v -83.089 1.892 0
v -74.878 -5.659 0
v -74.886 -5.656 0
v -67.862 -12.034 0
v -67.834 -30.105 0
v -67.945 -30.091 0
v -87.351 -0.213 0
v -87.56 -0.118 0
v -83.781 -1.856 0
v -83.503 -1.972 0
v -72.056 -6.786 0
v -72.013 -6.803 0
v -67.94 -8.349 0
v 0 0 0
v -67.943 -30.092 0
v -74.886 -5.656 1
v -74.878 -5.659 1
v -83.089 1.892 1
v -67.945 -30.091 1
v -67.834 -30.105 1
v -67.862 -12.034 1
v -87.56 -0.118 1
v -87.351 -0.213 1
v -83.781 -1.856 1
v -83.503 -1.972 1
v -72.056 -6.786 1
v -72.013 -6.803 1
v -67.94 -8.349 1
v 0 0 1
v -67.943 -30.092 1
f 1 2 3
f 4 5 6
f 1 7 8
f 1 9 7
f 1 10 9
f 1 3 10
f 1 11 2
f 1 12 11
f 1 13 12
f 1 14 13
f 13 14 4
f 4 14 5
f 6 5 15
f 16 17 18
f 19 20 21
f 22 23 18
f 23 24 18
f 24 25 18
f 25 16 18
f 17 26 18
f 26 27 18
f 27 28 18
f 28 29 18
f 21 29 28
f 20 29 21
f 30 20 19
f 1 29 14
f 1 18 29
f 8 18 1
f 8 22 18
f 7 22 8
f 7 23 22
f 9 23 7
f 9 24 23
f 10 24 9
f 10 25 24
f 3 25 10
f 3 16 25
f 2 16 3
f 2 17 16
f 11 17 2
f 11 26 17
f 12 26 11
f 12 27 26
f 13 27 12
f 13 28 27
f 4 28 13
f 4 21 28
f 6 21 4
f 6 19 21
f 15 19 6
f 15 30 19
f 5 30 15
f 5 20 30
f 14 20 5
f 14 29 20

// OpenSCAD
// Generated by SolidPython 1.1.3 on 2024-05-19 23:35:49


linear_extrude(height = 1) {
	polygon(points = [[0, 0], [-83.0891695313, 1.8917038359], [-83.1579500000, 1.8607885000], [-83.2267304687, 1.8298731641], [-83.2955109375, 1.7989578281], [-83.3642914063, 1.7680424922], [-83.4330718750, 1.7371271563], [-83.5018523437, 1.7062118203], [-83.5706328125, 1.6752964844], [-83.6394132813, 1.6443811484], [-83.7081937500, 1.6134658125], [-83.7769742187, 1.5825504766], [-83.8457546875, 1.5516351406], [-83.9145351562, 1.5207198047], [-83.9833156250, 1.4898044688], [-84.0520960937, 1.4588891328], [-84.1208765625, 1.4279737969], [-84.1896570312, 1.3970584609], [-84.2584375000, 1.3661431250], [-84.3272179688, 1.3352277891], [-84.3959984375, 1.3043124531], [-84.4647789063, 1.2733971172], [-84.5335593750, 1.2424817813], [-84.6023398438, 1.2115664453], [-84.6711203125, 1.1806511094], [-84.7399007813, 1.1497357734], [-84.8086812500, 1.1188204375], [-84.8774617187, 1.0879051016], [-84.9462421875, 1.0569897656], [-85.0150226563, 1.0260744297], [-85.0838031250, 0.9951590938], [-85.1525835937, 0.9642437578], [-85.2213640625, 0.9333284219], [-85.2901445313, 0.9024130859], [-85.3589250000, 0.8714977500], [-85.4277054687, 0.8405824141], [-85.4964859375, 0.8096670781], [-85.5652664063, 0.7787517422], [-85.6340468750, 0.7478364063], [-85.7028273437, 0.7169210703], [-85.7716078125, 0.6860057344], [-85.8403882813, 0.6550903984], [-85.9091687500, 0.6241750625], [-85.9779492187, 0.5932597266], [-86.0467296875, 0.5623443906], [-86.1155101562, 0.5314290547], [-86.1842906250, 0.5005137187], [-86.2530710937, 0.4695983828], [-86.3218515625, 0.4386830469], [-86.3906320312, 0.4077677109], [-86.4594125000, 0.3768523750], [-86.5281929688, 0.3459370391], [-86.5969734375, 0.3150217031], [-86.6657539063, 0.2841063672], [-86.7345343750, 0.2531910313], [-86.8033148438, 0.2222756953], [-86.8720953125, 0.1913603594], [-86.9408757813, 0.1604450234], [-87.0096562500, 0.1295296875], [-87.0784367187, 0.0986143516], [-87.1472171875, 0.0676990156], [-87.2159976563, 0.0367836797], [-87.2847781250, 0.0058683438], [-87.3535585937, -0.0250469922], [-87.4223390625, -0.0559623281], [-87.4911195313, -0.0868776641], [-87.5599000000, -0.1177930000], [-87.5078000000, -0.1415062500], [-87.4557000000, -0.1652195000], [-87.4036000000, -0.1889327500], [-87.3515000000, -0.2126460000], [-87.2957093750, -0.2383304375], [-87.2399187500, -0.2640148750], [-87.1841281250, -0.2896993125], [-87.1283375000, -0.3153837500], [-87.0725468750, -0.3410681875], [-87.0167562500, -0.3667526250], [-86.9609656250, -0.3924370625], [-86.9051750000, -0.4181215000], [-86.8493843750, -0.4438059375], [-86.7935937500, -0.4694903750], [-86.7378031250, -0.4951748125], [-86.6820125000, -0.5208592500], [-86.6262218750, -0.5465436875], [-86.5704312500, -0.5722281250], [-86.5146406250, -0.5979125625], [-86.4588500000, -0.6235970000], [-86.4030593750, -0.6492814375], [-86.3472687500, -0.6749658750], [-86.2914781250, -0.7006503125], [-86.2356875000, -0.7263347500], [-86.1798968750, -0.7520191875], [-86.1241062500, -0.7777036250], [-86.0683156250, -0.8033880625], [-86.0125250000, -0.8290725000], [-85.9567343750, -0.8547569375], [-85.9009437500, -0.8804413750], [-85.8451531250, -0.9061258125], [-85.7893625000, -0.9318102500], [-85.7335718750, -0.9574946875], [-85.6777812500, -0.9831791250], [-85.6219906250, -1.0088635625], [-85.5662000000, -1.0345480000], [-85.5104093750, -1.0602324375], [-85.4546187500, -1.0859168750], [-85.3988281250, -1.1116013125], [-85.3430375000, -1.1372857500], [-85.2872468750, -1.1629701875], [-85.2314562500, -1.1886546250], [-85.1756656250, -1.2143390625], [-85.1198750000, -1.2400235000], [-85.0640843750, -1.2657079375], [-85.0082937500, -1.2913923750], [-84.9525031250, -1.3170768125], [-84.8967125000, -1.3427612500], [-84.8409218750, -1.3684456875], [-84.7851312500, -1.3941301250], [-84.7293406250, -1.4198145625], [-84.6735500000, -1.4454990000], [-84.6177593750, -1.4711834375], [-84.5619687500, -1.4968678750], [-84.5061781250, -1.5225523125], [-84.4503875000, -1.5482367500], [-84.3945968750, -1.5739211875], [-84.3388062500, -1.5996056250], [-84.2830156250, -1.6252900625], [-84.2272250000, -1.6509745000], [-84.1714343750, -1.6766589375], [-84.1156437500, -1.7023433750], [-84.0598531250, -1.7280278125], [-84.0040625000, -1.7537122500], [-83.9482718750, -1.7793966875], [-83.8924812500, -1.8050811250], [-83.8366906250, -1.8307655625], [-83.7809000000, -1.8564500000], [-83.7114750000, -1.8854125000], [-83.6420500000, -1.9143750000], [-83.5726250000, -1.9433375000], [-83.5032000000, -1.9723000000], [-83.4358750000, -2.0010806250], [-83.3685500000, -2.0298612500], [-83.3012250000, -2.0586418750], [-83.2339000000, -2.0874225000], [-83.1665750000, -2.1162031250], [-83.0992500000, -2.1449837500], [-83.0319250000, -2.1737643750], [-82.9646000000, -2.2025450000], [-82.8972750000, -2.2313256250], [-82.8299500000, -2.2601062500], [-82.7626250000, -2.2888868750], [-82.6953000000, -2.3176675000], [-82.6279750000, -2.3464481250], [-82.5606500000, -2.3752287500], [-82.4933250000, -2.4040093750], [-82.4260000000, -2.4327900000], [-82.3586750000, -2.4615706250], [-82.2913500000, -2.4903512500], [-82.2240250000, -2.5191318750], [-82.1567000000, -2.5479125000], [-82.0893750000, -2.5766931250], [-82.0220500000, -2.6054737500], [-81.9547250000, -2.6342543750], [-81.8874000000, -2.6630350000], [-81.8200750000, -2.6918156250], [-81.7527500000, -2.7205962500], [-81.6854250000, -2.7493768750], [-81.6181000000, -2.7781575000], [-81.5507750000, -2.8069381250], [-81.4834500000, -2.8357187500], [-81.4161250000, -2.8644993750], [-81.3488000000, -2.8932800000], [-81.2814750000, -2.9220606250], [-81.2141500000, -2.9508412500], [-81.1468250000, -2.9796218750], [-81.0795000000, -3.0084025000], [-81.0121750000, -3.0371831250], [-80.9448500000, -3.0659637500], [-80.8775250000, -3.0947443750], [-80.8102000000, -3.1235250000], [-80.7428750000, -3.1523056250], [-80.6755500000, -3.1810862500], [-80.6082250000, -3.2098668750], [-80.5409000000, -3.2386475000], [-80.4735750000, -3.2674281250], [-80.4062500000, -3.2962087500], [-80.3389250000, -3.3249893750], [-80.2716000000, -3.3537700000], [-80.2042750000, -3.3825506250], [-80.1369500000, -3.4113312500], [-80.0696250000, -3.4401118750], [-80.0023000000, -3.4688925000], [-79.9349750000, -3.4976731250], [-79.8676500000, -3.5264537500], [-79.8003250000, -3.5552343750], [-79.7330000000, -3.5840150000], [-79.6656750000, -3.6127956250], [-79.5983500000, -3.6415762500], [-79.5310250000, -3.6703568750], [-79.4637000000, -3.6991375000], [-79.3963750000, -3.7279181250], [-79.3290500000, -3.7566987500], [-79.2617250000, -3.7854793750], [-79.1944000000, -3.8142600000], [-79.1270750000, -3.8430406250], [-79.0597500000, -3.8718212500], [-78.9924250000, -3.9006018750], [-78.9251000000, -3.9293825000], [-78.8577750000, -3.9581631250], [-78.7904500000, -3.9869437500], [-78.7231250000, -4.0157243750], [-78.6558000000, -4.0445050000], [-78.5884750000, -4.0732856250], [-78.5211500000, -4.1020662500], [-78.4538250000, -4.1308468750], [-78.3865000000, -4.1596275000], [-78.3191750000, -4.1884081250], [-78.2518500000, -4.2171887500], [-78.1845250000, -4.2459693750], [-78.1172000000, -4.2747500000], [-78.0498750000, -4.3035306250], [-77.9825500000, -4.3323112500], [-77.9152250000, -4.3610918750], [-77.8479000000, -4.3898725000], [-77.7805750000, -4.4186531250], [-77.7132500000, -4.4474337500], [-77.6459250000, -4.4762143750], [-77.5786000000, -4.5049950000], [-77.5112750000, -4.5337756250], [-77.4439500000, -4.5625562500], [-77.3766250000, -4.5913368750], [-77.3093000000, -4.6201175000], [-77.2419750000, -4.6488981250], [-77.1746500000, -4.6776787500], [-77.1073250000, -4.7064593750], [-77.0400000000, -4.7352400000], [-76.9726750000, -4.7640206250], [-76.9053500000, -4.7928012500], [-76.8380250000, -4.8215818750], [-76.7707000000, -4.8503625000], [-76.7033750000, -4.8791431250], [-76.6360500000, -4.9079237500], [-76.5687250000, -4.9367043750], [-76.5014000000, -4.9654850000], [-76.4340750000, -4.9942656250], [-76.3667500000, -5.0230462500], [-76.2994250000, -5.0518268750], [-76.2321000000, -5.0806075000], [-76.1647750000, -5.1093881250], [-76.0974500000, -5.1381687500], [-76.0301250000, -5.1669493750], [-75.9628000000, -5.1957300000], [-75.8954750000, -5.2245106250], [-75.8281500000, -5.2532912500], [-75.7608250000, -5.2820718750], [-75.6935000000, -5.3108525000], [-75.6261750000, -5.3396331250], [-75.5588500000, -5.3684137500], [-75.4915250000, -5.3971943750], [-75.4242000000, -5.4259750000], [-75.3568750000, -5.4547556250], [-75.2895500000, -5.4835362500], [-75.2222250000, -5.5123168750], [-75.1549000000, -5.5410975000], [-75.0875750000, -5.5698781250], [-75.0202500000, -5.5986587500], [-74.9529250000, -5.6274393750], [-74.8856000000, -5.6562200000], [-74.8780000000, -5.6592000000], [-74.7898125000, -5.6944259375], [-74.7016250000, -5.7296518750], [-74.6134375000, -5.7648778125], [-74.5252500000, -5.8001037500], [-74.4370625000, -5.8353296875], [-74.3488750000, -5.8705556250], [-74.2606875000, -5.9057815625], [-74.1725000000, -5.9410075000], [-74.0843125000, -5.9762334375], [-73.9961250000, -6.0114593750], [-73.9079375000, -6.0466853125], [-73.8197500000, -6.0819112500], [-73.7315625000, -6.1171371875], [-73.6433750000, -6.1523631250], [-73.5551875000, -6.1875890625], [-73.4670000000, -6.2228150000], [-73.3788125000, -6.2580409375], [-73.2906250000, -6.2932668750], [-73.2024375000, -6.3284928125], [-73.1142500000, -6.3637187500], [-73.0260625000, -6.3989446875], [-72.9378750000, -6.4341706250], [-72.8496875000, -6.4693965625], [-72.7615000000, -6.5046225000], [-72.6733125000, -6.5398484375], [-72.5851250000, -6.5750743750], [-72.4969375000, -6.6103003125], [-72.4087500000, -6.6455262500], [-72.3205625000, -6.6807521875], [-72.2323750000, -6.7159781250], [-72.1441875000, -6.7512040625], [-72.0560000000, -6.7864300000], [-72.0130000000, -6.8028000000], [-71.9493640625, -6.8269568750], [-71.8857281250, -6.8511137500], [-71.8220921875, -6.8752706250], [-71.7584562500, -6.8994275000], [-71.6948203125, -6.9235843750], [-71.6311843750, -6.9477412500], [-71.5675484375, -6.9718981250], [-71.5039125000, -6.9960550000], [-71.4402765625, -7.0202118750], [-71.3766406250, -7.0443687500], [-71.3130046875, -7.0685256250], [-71.2493687500, -7.0926825000], [-71.1857328125, -7.1168393750], [-71.1220968750, -7.1409962500], [-71.0584609375, -7.1651531250], [-70.9948250000, -7.1893100000], [-70.9311890625, -7.2134668750], [-70.8675531250, -7.2376237500], [-70.8039171875, -7.2617806250], [-70.7402812500, -7.2859375000], [-70.6766453125, -7.3100943750], [-70.6130093750, -7.3342512500], [-70.5493734375, -7.3584081250], [-70.4857375000, -7.3825650000], [-70.4221015625, -7.4067218750], [-70.3584656250, -7.4308787500], [-70.2948296875, -7.4550356250], [-70.2311937500, -7.4791925000], [-70.1675578125, -7.5033493750], [-70.1039218750, -7.5275062500], [-70.0402859375, -7.5516631250], [-69.9766500000, -7.5758200000], [-69.9130140625, -7.5999768750], [-69.8493781250, -7.6241337500], [-69.7857421875, -7.6482906250], [-69.7221062500, -7.6724475000], [-69.6584703125, -7.6966043750], [-69.5948343750, -7.7207612500], [-69.5311984375, -7.7449181250], [-69.4675625000, -7.7690750000], [-69.4039265625, -7.7932318750], [-69.3402906250, -7.8173887500], [-69.2766546875, -7.8415456250], [-69.2130187500, -7.8657025000], [-69.1493828125, -7.8898593750], [-69.0857468750, -7.9140162500], [-69.0221109375, -7.9381731250], [-68.9584750000, -7.9623300000], [-68.8948390625, -7.9864868750], [-68.8312031250, -8.0106437500], [-68.7675671875, -8.0348006250], [-68.7039312500, -8.0589575000], [-68.6402953125, -8.0831143750], [-68.5766593750, -8.1072712500], [-68.5130234375, -8.1314281250], [-68.4493875000, -8.1555850000], [-68.3857515625, -8.1797418750], [-68.3221156250, -8.2038987500], [-68.2584796875, -8.2280556250], [-68.1948437500, -8.2522125000], [-68.1312078125, -8.2763693750], [-68.0675718750, -8.3005262500], [-68.0039359375, -8.3246831250], [-67.9403000000, -8.3488400000], [-67.9390703125, -8.4064143750], [-67.9378406250, -8.4639887500], [-67.9366109375, -8.5215631250], [-67.9353812500, -8.5791375000], [-67.9341515625, -8.6367118750], [-67.9329218750, -8.6942862500], [-67.9316921875, -8.7518606250], [-67.9304625000, -8.8094350000], [-67.9292328125, -8.8670093750], [-67.9280031250, -8.9245837500], [-67.9267734375, -8.9821581250], [-67.9255437500, -9.0397325000], [-67.9243140625, -9.0973068750], [-67.9230843750, -9.1548812500], [-67.9218546875, -9.2124556250], [-67.9206250000, -9.2700300000], [-67.9193953125, -9.3276043750], [-67.9181656250, -9.3851787500], [-67.9169359375, -9.4427531250], [-67.9157062500, -9.5003275000], [-67.9144765625, -9.5579018750], [-67.9132468750, -9.6154762500], [-67.9120171875, -9.6730506250], [-67.9107875000, -9.7306250000], [-67.9095578125, -9.7881993750], [-67.9083281250, -9.8457737500], [-67.9070984375, -9.9033481250], [-67.9058687500, -9.9609225000], [-67.9046390625, -10.0184968750], [-67.9034093750, -10.0760712500], [-67.9021796875, -10.1336456250], [-67.9009500000, -10.1912200000], [-67.8997203125, -10.2487943750], [-67.8984906250, -10.3063687500], [-67.8972609375, -10.3639431250], [-67.8960312500, -10.4215175000], [-67.8948015625, -10.4790918750], [-67.8935718750, -10.5366662500], [-67.8923421875, -10.5942406250], [-67.8911125000, -10.6518150000], [-67.8898828125, -10.7093893750], [-67.8886531250, -10.7669637500], [-67.8874234375, -10.8245381250], [-67.8861937500, -10.8821125000], [-67.8849640625, -10.9396868750], [-67.8837343750, -10.9972612500], [-67.8825046875, -11.0548356250], [-67.8812750000, -11.1124100000], [-67.8800453125, -11.1699843750], [-67.8788156250, -11.2275587500], [-67.8775859375, -11.2851331250], [-67.8763562500, -11.3427075000], [-67.8751265625, -11.4002818750], [-67.8738968750, -11.4578562500], [-67.8726671875, -11.5154306250], [-67.8714375000, -11.5730050000], [-67.8702078125, -11.6305793750], [-67.8689781250, -11.6881537500], [-67.8677484375, -11.7457281250], [-67.8665187500, -11.8033025000], [-67.8652890625, -11.8608768750], [-67.8640593750, -11.9184512500], [-67.8628296875, -11.9760256250], [-67.8616000000, -12.0336000000], [-67.8619257812, -12.1041386719], [-67.8622515625, -12.1746773437], [-67.8625773438, -12.2452160156], [-67.8629031250, -12.3157546875], [-67.8632289063, -12.3862933594], [-67.8635546875, -12.4568320313], [-67.8638804687, -12.5273707031], [-67.8642062500, -12.5979093750], [-67.8645320312, -12.6684480469], [-67.8648578125, -12.7389867188], [-67.8651835938, -12.8095253906], [-67.8655093750, -12.8800640625], [-67.8658351563, -12.9506027344], [-67.8661609375, -13.0211414063], [-67.8664867188, -13.0916800781], [-67.8668125000, -13.1622187500], [-67.8671382813, -13.2327574219], [-67.8674640625, -13.3032960938], [-67.8677898438, -13.3738347656], [-67.8681156250, -13.4443734375], [-67.8684414062, -13.5149121094], [-67.8687671875, -13.5854507813], [-67.8690929688, -13.6559894531], [-67.8694187500, -13.7265281250], [-67.8697445313, -13.7970667969], [-67.8700703125, -13.8676054688], [-67.8703960938, -13.9381441406], [-67.8707218750, -14.0086828125], [-67.8710476563, -14.0792214844], [-67.8713734375, -14.1497601563], [-67.8716992188, -14.2202988281], [-67.8720250000, -14.2908375000], [-67.8723507813, -14.3613761719], [-67.8726765625, -14.4319148438], [-67.8730023438, -14.5024535156], [-67.8733281250, -14.5729921875], [-67.8736539062, -14.6435308594], [-67.8739796875, -14.7140695312], [-67.8743054688, -14.7846082031], [-67.8746312500, -14.8551468750], [-67.8749570313, -14.9256855469], [-67.8752828125, -14.9962242187], [-67.8756085938, -15.0667628906], [-67.8759343750, -15.1373015625], [-67.8762601563, -15.2078402344], [-67.8765859375, -15.2783789062], [-67.8769117188, -15.3489175781], [-67.8772375000, -15.4194562500], [-67.8775632813, -15.4899949219], [-67.8778890625, -15.5605335937], [-67.8782148438, -15.6310722656], [-67.8785406250, -15.7016109375], [-67.8788664062, -15.7721496094], [-67.8791921875, -15.8426882813], [-67.8795179688, -15.9132269531], [-67.8798437500, -15.9837656250], [-67.8801695313, -16.0543042969], [-67.8804953125, -16.1248429688], [-67.8808210938, -16.1953816406], [-67.8811468750, -16.2659203125], [-67.8814726563, -16.3364589844], [-67.8817984375, -16.4069976562], [-67.8821242188, -16.4775363281], [-67.8824500000, -16.5480750000], [-67.8827757813, -16.6186136719], [-67.8831015625, -16.6891523438], [-67.8834273438, -16.7596910156], [-67.8837531250, -16.8302296875], [-67.8840789062, -16.9007683594], [-67.8844046875, -16.9713070312], [-67.8847304688, -17.0418457031], [-67.8850562500, -17.1123843750], [-67.8853820313, -17.1829230469], [-67.8857078125, -17.2534617187], [-67.8860335938, -17.3240003906], [-67.8863593750, -17.3945390625], [-67.8866851563, -17.4650777344], [-67.8870109375, -17.5356164062], [-67.8873367188, -17.6061550781], [-67.8876625000, -17.6766937500], [-67.8879882813, -17.7472324219], [-67.8883140625, -17.8177710937], [-67.8886398437, -17.8883097656], [-67.8889656250, -17.9588484375], [-67.8892914062, -18.0293871094], [-67.8896171875, -18.0999257813], [-67.8899429688, -18.1704644531], [-67.8902687500, -18.2410031250], [-67.8905945313, -18.3115417969], [-67.8909203125, -18.3820804687], [-67.8912460938, -18.4526191406], [-67.8915718750, -18.5231578125], [-67.8918976563, -18.5936964844], [-67.8922234375, -18.6642351563], [-67.8925492188, -18.7347738281], [-67.8928750000, -18.8053125000], [-67.8932007813, -18.8758511719], [-67.8935265625, -18.9463898437], [-67.8938523437, -19.0169285156], [-67.8941781250, -19.0874671875], [-67.8945039062, -19.1580058594], [-67.8948296875, -19.2285445313], [-67.8951554688, -19.2990832031], [-67.8954812500, -19.3696218750], [-67.8958070313, -19.4401605469], [-67.8961328125, -19.5106992187], [-67.8964585938, -19.5812378906], [-67.8967843750, -19.6517765625], [-67.8971101563, -19.7223152344], [-67.8974359375, -19.7928539063], [-67.8977617188, -19.8633925781], [-67.8980875000, -19.9339312500], [-67.8984132813, -20.0044699219], [-67.8987390625, -20.0750085937], [-67.8990648437, -20.1455472656], [-67.8993906250, -20.2160859375], [-67.8997164062, -20.2866246094], [-67.9000421875, -20.3571632813], [-67.9003679688, -20.4277019531], [-67.9006937500, -20.4982406250], [-67.9010195313, -20.5687792969], [-67.9013453125, -20.6393179687], [-67.9016710938, -20.7098566406], [-67.9019968750, -20.7803953125], [-67.9023226563, -20.8509339844], [-67.9026484375, -20.9214726563], [-67.9029742188, -20.9920113281], [-67.9033000000, -21.0625500000], [-67.9036257812, -21.1330886719], [-67.9039515625, -21.2036273438], [-67.9042773437, -21.2741660156], [-67.9046031250, -21.3447046875], [-67.9049289062, -21.4152433594], [-67.9052546875, -21.4857820313], [-67.9055804688, -21.5563207031], [-67.9059062500, -21.6268593750], [-67.9062320312, -21.6973980469], [-67.9065578125, -21.7679367188], [-67.9068835938, -21.8384753906], [-67.9072093750, -21.9090140625], [-67.9075351563, -21.9795527344], [-67.9078609375, -22.0500914063], [-67.9081867188, -22.1206300781], [-67.9085125000, -22.1911687500], [-67.9088382812, -22.2617074219], [-67.9091640625, -22.3322460938], [-67.9094898437, -22.4027847656], [-67.9098156250, -22.4733234375], [-67.9101414062, -22.5438621094], [-67.9104671875, -22.6144007813], [-67.9107929688, -22.6849394531], [-67.9111187500, -22.7554781250], [-67.9114445312, -22.8260167969], [-67.9117703125, -22.8965554688], [-67.9120960938, -22.9670941406], [-67.9124218750, -23.0376328125], [-67.9127476563, -23.1081714844], [-67.9130734375, -23.1787101562], [-67.9133992188, -23.2492488281], [-67.9137250000, -23.3197875000], [-67.9140507812, -23.3903261719], [-67.9143765625, -23.4608648438], [-67.9147023437, -23.5314035156], [-67.9150281250, -23.6019421875], [-67.9153539062, -23.6724808594], [-67.9156796875, -23.7430195312], [-67.9160054688, -23.8135582031], [-67.9163312500, -23.8840968750], [-67.9166570312, -23.9546355469], [-67.9169828125, -24.0251742187], [-67.9173085938, -24.0957128906], [-67.9176343750, -24.1662515625], [-67.9179601563, -24.2367902344], [-67.9182859375, -24.3073289062], [-67.9186117188, -24.3778675781], [-67.9189375000, -24.4484062500], [-67.9192632812, -24.5189449219], [-67.9195890625, -24.5894835937], [-67.9199148437, -24.6600222656], [-67.9202406250, -24.7305609375], [-67.9205664062, -24.8010996094], [-67.9208921875, -24.8716382813], [-67.9212179687, -24.9421769531], [-67.9215437500, -25.0127156250], [-67.9218695312, -25.0832542969], [-67.9221953125, -25.1537929687], [-67.9225210938, -25.2243316406], [-67.9228468750, -25.2948703125], [-67.9231726563, -25.3654089844], [-67.9234984375, -25.4359476563], [-67.9238242187, -25.5064863281], [-67.9241500000, -25.5770250000], [-67.9244757812, -25.6475636719], [-67.9248015625, -25.7181023437], [-67.9251273437, -25.7886410156], [-67.9254531250, -25.8591796875], [-67.9257789062, -25.9297183594], [-67.9261046875, -26.0002570313], [-67.9264304687, -26.0707957031], [-67.9267562500, -26.1413343750], [-67.9270820312, -26.2118730469], [-67.9274078125, -26.2824117187], [-67.9277335938, -26.3529503906], [-67.9280593750, -26.4234890625], [-67.9283851563, -26.4940277344], [-67.9287109375, -26.5645664063], [-67.9290367187, -26.6351050781], [-67.9293625000, -26.7056437500], [-67.9296882812, -26.7761824219], [-67.9300140625, -26.8467210937], [-67.9303398437, -26.9172597656], [-67.9306656250, -26.9877984375], [-67.9309914062, -27.0583371094], [-67.9313171875, -27.1288757813], [-67.9316429687, -27.1994144531], [-67.9319687500, -27.2699531250], [-67.9322945312, -27.3404917969], [-67.9326203125, -27.4110304687], [-67.9329460938, -27.4815691406], [-67.9332718750, -27.5521078125], [-67.9335976563, -27.6226464844], [-67.9339234375, -27.6931851563], [-67.9342492187, -27.7637238281], [-67.9345750000, -27.8342625000], [-67.9349007812, -27.9048011719], [-67.9352265625, -27.9753398437], [-67.9355523437, -28.0458785156], [-67.9358781250, -28.1164171875], [-67.9362039062, -28.1869558594], [-67.9365296875, -28.2574945313], [-67.9368554687, -28.3280332031], [-67.9371812500, -28.3985718750], [-67.9375070312, -28.4691105469], [-67.9378328125, -28.5396492188], [-67.9381585938, -28.6101878906], [-67.9384843750, -28.6807265625], [-67.9388101562, -28.7512652344], [-67.9391359375, -28.8218039063], [-67.9394617187, -28.8923425781], [-67.9397875000, -28.9628812500], [-67.9401132812, -29.0334199219], [-67.9404390625, -29.1039585938], [-67.9407648437, -29.1744972656], [-67.9410906250, -29.2450359375], [-67.9414164062, -29.3155746094], [-67.9417421875, -29.3861132813], [-67.9420679687, -29.4566519531], [-67.9423937500, -29.5271906250], [-67.9427195312, -29.5977292969], [-67.9430453125, -29.6682679688], [-67.9433710938, -29.7388066406], [-67.9436968750, -29.8093453125], [-67.9440226562, -29.8798839844], [-67.9443484375, -29.9504226562], [-67.9446742187, -30.0209613281], [-67.9450000000, -30.0915000000], [-67.9427000000, -30.0918000000], [-67.8885125000, -30.0982421875], [-67.8343250000, -30.1046843750]]);
}
/***********************************************
*********      SolidPython code:      **********
************************************************
 
import math
import time

from stl import mesh, Dimension

from tkinter import Tk     # from tkinter import Tk for Python 3.x
from tkinter.filedialog import askopenfilename
from mpl_toolkits.mplot3d import art3d
from matplotlib import pyplot as plt
import solid
import os
import ezdxf
import shapely.geometry as sg
import subprocess
from GUI import getSCADPath



def outputSTL(From, To, PATH=getSCADPath()):
    subprocess.Popen(PATH + " -o " + To + " " + From)
    while not os.path.exists(To):
        time.sleep(1)


def get_size(i):
    x_list = [int(a) for a in str(i)]
    return len(x_list)



class Model:
    def __init__(self, model, fileName, location, layer, thickness):
        self.location = location
        self.code = None
        self.fileName = fileName
        self.stl = fileName + ".stl"
        self.layer = layer
        self.thickness = thickness
        self.maxz = (layer+1)*thickness
        self.dxf = fileName + ".dxf"
        self.scad = fileName + ".scad"
        self.model = model
        self.center = None
        self.width = 10
        self.mesh = None
        self.useable_area = None


    def get_code(self):
        max_dim = 0.05
        max_array = 6

        num = int(self.fileName)
        nums = [int(a) for a in str(num)]
        nums.reverse()
        indices = nums
        length = len(nums)

        print(indices)
        t = 0
        i = 0
        cubes = []
        x = 0
        y = 0
        width = 0.01
        while x <= max_dim:
            while y <= max_dim:
                print(indices)
                if nums == []:
                    break
                if indices[0] != 0:
                    cubes.append(solid.translate([x, y, 0])(solid.cube(size=t / 1000 + 0.001)))
                    y += max_dim / (max_array - 1)
                    nums[0] = nums[0] - 1
                else:
                    indices.pop(0)
                    t += 1
                i += 1
            x += max_dim / (max_array - 1)
            y = 0

        outside = solid.translate([-width / 2, -width / 2])(solid.cube(max_dim + (length - 1) / 1000 + 0.001 + width))
        self.code = solid.difference()(outside, cubes)
        self.code = solid.projection(cut=True)(self.code)
        solid.scad_render_to_file(self.code, self.location + "/code.scad")
        outputSTL(From=self.location+"/code.scad", To=self.location+"code.dxf", PATH=getSCADPath())
        # os.system("toSTL.sh renders/code.scad renders/code.dxf")
        return self.location+"/code.dxf"

    def download(self, type):
        if type =="stl":
            print("generating:" + self.location+"/"+ self.fileName+".stl")
            outputSTL(From=self.location+"/"+self.fileName+".scad", To=self.location+"/"+self.fileName+".stl")
            # os.system("toSTL.sh renders/"+ self.fileName+".scad renders/"+ self.fileName+".stl")
        elif type == "dxf":
            outputSTL(From=self.location+"/"+self.fileName+".scad", To=self.location+"/"+self.fileName+".dxf")
            # os.system("toSTL.sh renders/"+ self.fileName+".scad renders/"+ self.fileName+".dxf")

    def render(self):
        solid.scad_render_to_file(self.model, self.location+"/"+ self.fileName+'.scad')
        while not os.path.exists(self.location+"/"+self.fileName+".scad"):
            time.sleep(1)

    def get_points(self):
        doc = ezdxf.readfile(filename=self.location+"/"+ self.fileName+".dxf")
        msp = doc.modelspace()
        i=0
        lists = []
        def helper(e):
            start = [e.dxf.start[0], e.dxf.start[1]]
            end = [e.dxf.end[0], e.dxf.end[1]]
            return [start, end]

        for e in msp.query("LINE"):
            line = helper(e)
            if not lists:
                lists.append([line])
            else:
                if lists[i][len(lists)-1][1] != line[0]:
                    lists.append([line])
                    i+=1
                else:
                    lists[i].append(line)

    def get_points2(self, FILE):
        doc = ezdxf.readfile(filename=FILE)
        msp = doc.modelspace()
        i = 0
        lists = []

        def helper(e):
            start = [e.dxf.start[0], e.dxf.start[1]]
            end = [e.dxf.end[0], e.dxf.end[1]]
            return (start, end)

        for e in msp.query("LINE"):
            line = helper(e)
            if lists==[]:
                lists.append([line])
            else:
                if lists[i][len(lists[i]) - 1][1] != line[0]:
                    lists.append([line])
                    i += 1
                else:
                    lists[i].append(line)
        return lists

    def add_code(self):
        dxf = solid.projection(cut=False)(self.model)
        offset = solid.offset(r=-0.1)(dxf)
        solid.scad_render_to_file(offset, self.location+'/offset.scad')
        os.system("toSTL.sh renders/offset.scad renders/offset.dxf")
        lines = self.get_points2("renders/offset.dxf")
        x = lines[0][0][0][0]
        y = lines[0][0][0][1]
        print(x)
        print(y)
        code = solid.translate([x,y,0])(self.code)
        code = solid.linear_extrude(height=999)(code)
        save = self.model
        self.model = solid.projection()(solid.difference()(self.model, code))
        self.render()
        self.download("dxf")
        self.model = save

    def add_label(self, pos):
        # num = 12
        # minx, maxx, miny, maxy, minz, maxz = self.find_minmax()
        maxz = self.maxz
        # label = solid.linear_extrude(height=(maxz-minz)/3)(solid.text(str(self.fileName), size=0.5, halign="center"))
        # i=minx
        # print("x-len: " + str(maxx-minx))
        # print(i)
        # inc = (maxx-minx)/num
        # while minx <= i <= maxx:
        #     label = solid.union()(solid.translate([i, 0, maxz - 0.2])(solid.linear_extrude(height=(maxz-minz)/3)(solid.text(str(self.fileName), size=0.25, halign="center"))), label)
        #     i += inc
        #
        # l = label
        #
        # i =miny
        # while miny<= i <= maxy:
        #     print("y inc")
        #     l = solid.union()(solid.translate([0, i, 0])(label), l)
        #     i += 0.5
        for i in str(self.fileName):
            cur = pos[0]
            label = solid.translate([pos[0][0], pos[0][1], self.maxz-0.2])(solid.linear_extrude(height=(self.thickness)/3)(solid.text(str(i), size=0.5, halign="center", valign="center")))
            self.model = solid.difference()(self.model, label)
            pos.append(pos.pop(0))
            while abs(cur[0]-pos[0][0])<0.5 and abs(cur[1]-pos[0][1])<0.5:
                pos.append(pos.pop(0))



    def Center(self):

        volume, cog, inertia = self.mesh.get_mass_properties()
        print("Volume                                  = {0}".format(volume))
        print("Position of the center of gravity (COG) = {0}".format(cog))
        m_centered = solid.translate([-cog[0], -cog[1], 0])(
            self.model
        )
        return m_centered

    def find_minmax(self):
        minx = maxx = miny = maxy = minz = maxz = None
        for p in self.mesh.points:
            # p contains (x, y, z)
            if minx is None:
                minx = p[Dimension.X]
                maxx = p[Dimension.X]
                miny = p[Dimension.Y]
                maxy = p[Dimension.Y]
                minz = p[Dimension.Z]
                maxz = p[Dimension.Z]
            else:
                maxx = max(p[Dimension.X], maxx)
                minx = min(p[Dimension.X], minx)
                maxy = max(p[Dimension.Y], maxy)
                miny = min(p[Dimension.Y], miny)
                maxz = max(p[Dimension.Z], maxz)
                minz = min(p[Dimension.Z], minz)
        lenx = maxx - minx
        leny = maxy - miny
        lenz = maxz - minz
        return minx, maxx, miny, maxy, minz, maxz

    # def generate_Mesh(self):
    #     self.mesh = mesh.Mesh.from_file(self.location + "/" + str(int(self.fileName)//8)+ "b.stl")

    def get_top(self):
        top = solid.projection(cut=True)(solid.translate([0,0,-1*self.thickness*(self.layer+1)])(self.model))
        useable_area = solid.offset(r=-0.45)(top)
        self.useable_area = useable_area
        solid.scad_render_to_file(self.useable_area, self.location+'/' + 'toptemp.scad')
        outputSTL(From=self.location+'/' + 'toptemp.scad', To=self.location+"/top"+ self.dxf)

        # os.system("toSTL.sh out/toptemp.scad renders/" + self.fileName + ".dxf")
        dxf = DXF(self.location+"/top"+ self.dxf)
        min_p=dxf.points[0][0]
        points_ordered = dxf.points
        i=0
        while i <= len(dxf.points)+1:
            while math.sqrt((dxf.points[0][0]-dxf.points[1][0])**2+(dxf.points[0][1]-dxf.points[1][1])**2) > 0.1:
                dxf.points.insert(1, [(dxf.points[0][0]+dxf.points[1][0])/2, (dxf.points[0][1]+dxf.points[1][1])/2])
                i = i-1
            dxf.points.append(dxf.points.pop(0))
            i+=1
        for i in range(len(dxf.points)):
            dxf.points.append(dxf.points.pop(0))
            if dxf.points[0][0] < min_p:
                min_p = dxf.points[0][0]
                points_ordered = dxf.points.copy()
        dxf.points = points_ordered.copy()

        print(dxf.points)
        self.add_label(dxf.points)

class DXF:
    def __init__(self, file):
        self.file = file
        self.Lines = []
        self.points = []
        doc = ezdxf.readfile(self.file)
        msp = doc.modelspace()
        for e in msp:
            if e.dxftype() == "LINE":
                self.Lines.append(e)
                self.points.append([e.dxf.start[0], e.dxf.start[1]])
        # self.points.append([self.Lines[-1].dxf.end[0], self.Lines[-1].dxf.end[1]])
        self.area = None
        self.center = None
        self.polygon = sg.Polygon(self.points)

    def get_area(self):
        self.area = self.polygon.area
        return self.area

    def get_center(self):
        x_sum = 0
        y_sum =0
        for i in self.points:
            x_sum += i[0]
            y_sum += i[1]
        x_c = x_sum/len(self.points)
        y_c = y_sum/len(self.points)
        return (x_c, y_c)

    def split(self, maxdim):
        splits = []
        length = 0
        pieces = [[]]
        prev = self.points[0]
        for j in self.points:
            length = length + math.sqrt((prev[0]-j[0])**2+(prev[1]-j[1])**2)
            if length >= maxdim:
                pieces[-1].append(j)
                pieces.append([])
                length = 0
            pieces[-1].append(j)
            prev = j
        for j in pieces:
            j.insert(0, [0,0])
            piece = solid.linear_extrude(height=1)(solid.polygon(j))
            splits.append(piece)
        return splits
    def refine_points(self):
        i=0
        while i <= len(self.points)+1:
            while math.sqrt((self.points[0][0]-self.points[1][0])**2+(self.points[0][1]-self.points[1][1])**2) > 0.1:
                self.points.insert(1, [(self.points[0][0]+self.points[1][0])/2, (self.points[0][1]+self.points[1][1])/2])
                i = i-1
            self.points.append(self.points.pop(0))
            i+=1


if __name__== "__main__":
    test = DXF("C:/Users/Daniel/Documents/repos/Shell_Maker/output/0top_slice.dxf")
    test.refine_points()
    k = test.split(48)
    for i in range(len(k)):
        solid.scad_render_to_file(k[i], str(i) + ".scad")


 
 
************************************************/
